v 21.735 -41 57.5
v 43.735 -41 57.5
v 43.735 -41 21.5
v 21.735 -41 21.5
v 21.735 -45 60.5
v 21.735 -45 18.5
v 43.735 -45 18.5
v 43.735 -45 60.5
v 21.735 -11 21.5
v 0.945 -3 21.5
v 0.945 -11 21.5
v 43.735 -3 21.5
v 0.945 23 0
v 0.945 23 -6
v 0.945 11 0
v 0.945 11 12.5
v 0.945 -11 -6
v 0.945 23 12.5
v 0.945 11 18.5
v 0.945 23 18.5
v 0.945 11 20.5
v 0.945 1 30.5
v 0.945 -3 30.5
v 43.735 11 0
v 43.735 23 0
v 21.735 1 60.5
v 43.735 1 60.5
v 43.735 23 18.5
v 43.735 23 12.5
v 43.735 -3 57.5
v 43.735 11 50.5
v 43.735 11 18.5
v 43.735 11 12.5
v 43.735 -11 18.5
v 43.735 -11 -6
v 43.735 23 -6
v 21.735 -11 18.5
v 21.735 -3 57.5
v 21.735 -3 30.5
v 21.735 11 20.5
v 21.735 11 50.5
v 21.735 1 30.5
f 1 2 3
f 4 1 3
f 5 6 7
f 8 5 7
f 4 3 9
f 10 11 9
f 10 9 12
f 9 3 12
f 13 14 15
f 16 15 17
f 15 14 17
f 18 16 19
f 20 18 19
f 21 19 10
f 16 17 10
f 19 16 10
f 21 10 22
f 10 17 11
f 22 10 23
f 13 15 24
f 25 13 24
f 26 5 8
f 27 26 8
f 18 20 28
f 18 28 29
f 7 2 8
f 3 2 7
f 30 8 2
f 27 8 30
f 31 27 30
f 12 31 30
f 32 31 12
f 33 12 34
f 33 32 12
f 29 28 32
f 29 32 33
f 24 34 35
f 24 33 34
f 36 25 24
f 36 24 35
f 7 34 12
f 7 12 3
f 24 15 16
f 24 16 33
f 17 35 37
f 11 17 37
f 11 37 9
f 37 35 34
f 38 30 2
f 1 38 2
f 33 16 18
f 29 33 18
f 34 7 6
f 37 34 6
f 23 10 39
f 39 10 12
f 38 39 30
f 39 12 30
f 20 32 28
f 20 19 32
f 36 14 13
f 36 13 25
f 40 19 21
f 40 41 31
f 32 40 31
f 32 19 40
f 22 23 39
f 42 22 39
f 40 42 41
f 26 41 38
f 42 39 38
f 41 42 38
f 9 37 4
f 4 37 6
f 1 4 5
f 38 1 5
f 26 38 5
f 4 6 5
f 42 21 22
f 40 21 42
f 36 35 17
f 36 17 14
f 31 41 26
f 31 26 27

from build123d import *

# Parameters (mm, degrees)
BOSS_EXTRUDE2_DEPTH   = 23
SKETCH1_W             = 20.789980378
SKETCH1_H             = 6
BOSS_EXTRUDE2_2_DEPTH = 23
BOSS_EXTRUDE2_3_DEPTH = 23
BOSS_EXTRUDE2_4_DEPTH = 23
SKETCH1_3_W           = 20.789980378
SKETCH1_3_H           = 36.5
BOSS_EXTRUDE3_DEPTH   = 11
BOSS_EXTRUDE5_DEPTH   = 45
SKETCH2_W             = 9
SKETCH2_H             = 8
CUT_EXTRUDE1_DEPTH    = 106.353028551
SKETCH3_W             = 24.5
SKETCH3_H             = 11
BOSS_EXTRUDE6_DEPTH   = 42
BOSS_EXTRUDE7_DEPTH   = 11
CHAMFER2_SIZE         = 10
SKETCH5_W             = 20.789980378
SKETCH5_H             = 34
CUT_EXTRUDE2_DEPTH    = 104.008391914
SKETCH6_W             = 6
SKETCH6_H             = 12
BOSS_EXTRUDE8_DEPTH   = 22


with BuildPart() as part:
    # Sketch1 → Boss-Extrude2 (new body)
    with BuildSketch(Plane(origin=(0, 0, 0), x_dir=(1, 0, 0), z_dir=(0, 1, 0))):
        Polygon((0.945063883, 6), (0.945063883, 0), (1.890127766, 0), (21.735044261, 0), (21.735044261, 6), align=None)
    extrude(amount=BOSS_EXTRUDE2_DEPTH)



with BuildPart() as body_2:
    # Sketch1 → Boss-Extrude2 2 (new body)
    with BuildSketch(Plane(origin=(0, 0, 0), x_dir=(1, 0, 0), z_dir=(0, 1, 0))):
        with Locations((11.340054072, -15.5)):
            Rectangle(SKETCH1_W, SKETCH1_H)
    extrude(amount=BOSS_EXTRUDE2_2_DEPTH)


with BuildPart() as body_3:
    # Sketch1 → Boss-Extrude2 3 (new body)
    with BuildSketch(Plane(origin=(0, 0, 0), x_dir=(1, 0, 0), z_dir=(0, 1, 0))):
        with Locations((54.13003445, -15.5)):
            Rectangle(SKETCH1_W, SKETCH1_H)
    extrude(amount=BOSS_EXTRUDE2_3_DEPTH)


with BuildPart() as body_4:
    # Sketch1 → Boss-Extrude2 4 (new body)
    with BuildSketch(Plane(origin=(0, 0, 0), x_dir=(1, 0, 0), z_dir=(0, 1, 0))):
        with Locations((54.13003445, 3)):
            Rectangle(SKETCH1_W, SKETCH1_H)
    extrude(amount=BOSS_EXTRUDE2_4_DEPTH)


with BuildPart() as part_1:
    add(part.part)

    add(body_2.part)  # Boss-Extrude3 merges body 2
    # Sketch1<3> → Boss-Extrude3 (add)
    with BuildSketch(Plane(origin=(0, 0, 0), x_dir=(1, 0, 0), z_dir=(0, 1, 0))):
        with Locations((11.340054072, -12.25)):
            Rectangle(SKETCH1_3_W, SKETCH1_3_H)
        with Locations((54.13003445, -12.25)):
            Rectangle(SKETCH1_3_W, SKETCH1_3_H)
    extrude(amount=-BOSS_EXTRUDE3_DEPTH)

    # Sketch1<6> → Boss-Extrude5 (add)
    with BuildSketch(Plane(origin=(0, 0, 0), x_dir=(1, 0, 0), z_dir=(0, 1, 0))):
        Polygon((43.735044261, -18.5), (32.735044261, -18.5), (32.735044261, -60.5), (43.735044261, -60.5), (43.735044261, -30.5), align=None)
        Polygon((32.735044261, -18.5), (21.735044261, -18.5), (21.735044261, -30.5), (21.735044261, -60.5), (32.735044261, -60.5), align=None)
    extrude(amount=-BOSS_EXTRUDE5_DEPTH)

    # Sketch2 → Cut-Extrude1 (cut, through all)
    with BuildSketch(Plane(origin=(74.525024639, 0, 0), x_dir=(0, 0, -1), z_dir=(1, 0, 0))):
        Polygon((-30.5, -11), (-30.5, -3), (-41.183889214, -3), (-57.5, -3), (-57.5, -14.989659462), (-57.5, -41), (-21.5, -41), (-21.5, -11), align=None)
        with Locations((-26, -7)):
            Rectangle(SKETCH2_W, SKETCH2_H)
    extrude(amount=-CUT_EXTRUDE1_DEPTH, mode=Mode.SUBTRACT)


    add(body_3.part)  # Boss-Extrude6 merges body 3

    add(body_4.part)  # Boss-Extrude6 merges body 4
    # Sketch3 → Boss-Extrude6 (add)
    with BuildSketch(Plane.ZY.offset(-43.735044261)):
        with Locations((6.25, -5.5)):
            Rectangle(SKETCH3_W, SKETCH3_H)
    extrude(amount=BOSS_EXTRUDE6_DEPTH)

    # Sketch4 → Boss-Extrude7 (add)
    with BuildSketch(Plane(origin=(0, 0, 0), x_dir=(1, 0, 0), z_dir=(0, 1, 0))):
        Polygon((64.525024639, -18.5), (43.735044261, -18.5), (43.735044261, -12.5), (64.525024639, -12.5), (64.525024639, 0), (43.735044261, 0), (43.735044261, 6), (21.735044261, 6), (21.735044261, 0), (0.945063883, 0), (0.945063883, -12.5), (21.735044261, -12.5), (21.735044261, -18.5), (0.945063883, -18.5), (0.945063883, -30.5), (21.735044261, -30.5), (21.735044261, -60.5), (43.735044261, -60.5), (43.735044261, -30.5), (64.525024639, -30.5), align=None)
    extrude(amount=BOSS_EXTRUDE7_DEPTH)

    # Chamfer2
    chamfer2_edges = [part_1.edges().sort_by_distance(p)[0] for p in [
        (11.340054072, 11, 30.5),
        (32.735044261, 11, 60.5),
        (54.13003445, 11, 30.5),
    ]]
    chamfer(chamfer2_edges, length=CHAMFER2_SIZE)

    # Sketch5 → Cut-Extrude2 (cut, through all)
    with BuildSketch(Plane(origin=(0, 0, -6), x_dir=(-1, 0, 0), z_dir=(0, 0, -1))):
        with Locations((-54.13003445, 6)):
            Rectangle(SKETCH5_W, SKETCH5_H)
    extrude(amount=-CUT_EXTRUDE2_DEPTH, mode=Mode.SUBTRACT)

    # Sketch6 → Boss-Extrude8 (add)
    with BuildSketch(Plane(origin=(21.735044261, 0, 0), x_dir=(0, 0, -1), z_dir=(1, 0, 0))):
        with Locations((-15.5, 17)):
            Rectangle(SKETCH6_W, SKETCH6_H)
        with Locations((3, 17)):
            Rectangle(SKETCH6_W, SKETCH6_H)
    extrude(amount=BOSS_EXTRUDE8_DEPTH)


solid = part_1.part
